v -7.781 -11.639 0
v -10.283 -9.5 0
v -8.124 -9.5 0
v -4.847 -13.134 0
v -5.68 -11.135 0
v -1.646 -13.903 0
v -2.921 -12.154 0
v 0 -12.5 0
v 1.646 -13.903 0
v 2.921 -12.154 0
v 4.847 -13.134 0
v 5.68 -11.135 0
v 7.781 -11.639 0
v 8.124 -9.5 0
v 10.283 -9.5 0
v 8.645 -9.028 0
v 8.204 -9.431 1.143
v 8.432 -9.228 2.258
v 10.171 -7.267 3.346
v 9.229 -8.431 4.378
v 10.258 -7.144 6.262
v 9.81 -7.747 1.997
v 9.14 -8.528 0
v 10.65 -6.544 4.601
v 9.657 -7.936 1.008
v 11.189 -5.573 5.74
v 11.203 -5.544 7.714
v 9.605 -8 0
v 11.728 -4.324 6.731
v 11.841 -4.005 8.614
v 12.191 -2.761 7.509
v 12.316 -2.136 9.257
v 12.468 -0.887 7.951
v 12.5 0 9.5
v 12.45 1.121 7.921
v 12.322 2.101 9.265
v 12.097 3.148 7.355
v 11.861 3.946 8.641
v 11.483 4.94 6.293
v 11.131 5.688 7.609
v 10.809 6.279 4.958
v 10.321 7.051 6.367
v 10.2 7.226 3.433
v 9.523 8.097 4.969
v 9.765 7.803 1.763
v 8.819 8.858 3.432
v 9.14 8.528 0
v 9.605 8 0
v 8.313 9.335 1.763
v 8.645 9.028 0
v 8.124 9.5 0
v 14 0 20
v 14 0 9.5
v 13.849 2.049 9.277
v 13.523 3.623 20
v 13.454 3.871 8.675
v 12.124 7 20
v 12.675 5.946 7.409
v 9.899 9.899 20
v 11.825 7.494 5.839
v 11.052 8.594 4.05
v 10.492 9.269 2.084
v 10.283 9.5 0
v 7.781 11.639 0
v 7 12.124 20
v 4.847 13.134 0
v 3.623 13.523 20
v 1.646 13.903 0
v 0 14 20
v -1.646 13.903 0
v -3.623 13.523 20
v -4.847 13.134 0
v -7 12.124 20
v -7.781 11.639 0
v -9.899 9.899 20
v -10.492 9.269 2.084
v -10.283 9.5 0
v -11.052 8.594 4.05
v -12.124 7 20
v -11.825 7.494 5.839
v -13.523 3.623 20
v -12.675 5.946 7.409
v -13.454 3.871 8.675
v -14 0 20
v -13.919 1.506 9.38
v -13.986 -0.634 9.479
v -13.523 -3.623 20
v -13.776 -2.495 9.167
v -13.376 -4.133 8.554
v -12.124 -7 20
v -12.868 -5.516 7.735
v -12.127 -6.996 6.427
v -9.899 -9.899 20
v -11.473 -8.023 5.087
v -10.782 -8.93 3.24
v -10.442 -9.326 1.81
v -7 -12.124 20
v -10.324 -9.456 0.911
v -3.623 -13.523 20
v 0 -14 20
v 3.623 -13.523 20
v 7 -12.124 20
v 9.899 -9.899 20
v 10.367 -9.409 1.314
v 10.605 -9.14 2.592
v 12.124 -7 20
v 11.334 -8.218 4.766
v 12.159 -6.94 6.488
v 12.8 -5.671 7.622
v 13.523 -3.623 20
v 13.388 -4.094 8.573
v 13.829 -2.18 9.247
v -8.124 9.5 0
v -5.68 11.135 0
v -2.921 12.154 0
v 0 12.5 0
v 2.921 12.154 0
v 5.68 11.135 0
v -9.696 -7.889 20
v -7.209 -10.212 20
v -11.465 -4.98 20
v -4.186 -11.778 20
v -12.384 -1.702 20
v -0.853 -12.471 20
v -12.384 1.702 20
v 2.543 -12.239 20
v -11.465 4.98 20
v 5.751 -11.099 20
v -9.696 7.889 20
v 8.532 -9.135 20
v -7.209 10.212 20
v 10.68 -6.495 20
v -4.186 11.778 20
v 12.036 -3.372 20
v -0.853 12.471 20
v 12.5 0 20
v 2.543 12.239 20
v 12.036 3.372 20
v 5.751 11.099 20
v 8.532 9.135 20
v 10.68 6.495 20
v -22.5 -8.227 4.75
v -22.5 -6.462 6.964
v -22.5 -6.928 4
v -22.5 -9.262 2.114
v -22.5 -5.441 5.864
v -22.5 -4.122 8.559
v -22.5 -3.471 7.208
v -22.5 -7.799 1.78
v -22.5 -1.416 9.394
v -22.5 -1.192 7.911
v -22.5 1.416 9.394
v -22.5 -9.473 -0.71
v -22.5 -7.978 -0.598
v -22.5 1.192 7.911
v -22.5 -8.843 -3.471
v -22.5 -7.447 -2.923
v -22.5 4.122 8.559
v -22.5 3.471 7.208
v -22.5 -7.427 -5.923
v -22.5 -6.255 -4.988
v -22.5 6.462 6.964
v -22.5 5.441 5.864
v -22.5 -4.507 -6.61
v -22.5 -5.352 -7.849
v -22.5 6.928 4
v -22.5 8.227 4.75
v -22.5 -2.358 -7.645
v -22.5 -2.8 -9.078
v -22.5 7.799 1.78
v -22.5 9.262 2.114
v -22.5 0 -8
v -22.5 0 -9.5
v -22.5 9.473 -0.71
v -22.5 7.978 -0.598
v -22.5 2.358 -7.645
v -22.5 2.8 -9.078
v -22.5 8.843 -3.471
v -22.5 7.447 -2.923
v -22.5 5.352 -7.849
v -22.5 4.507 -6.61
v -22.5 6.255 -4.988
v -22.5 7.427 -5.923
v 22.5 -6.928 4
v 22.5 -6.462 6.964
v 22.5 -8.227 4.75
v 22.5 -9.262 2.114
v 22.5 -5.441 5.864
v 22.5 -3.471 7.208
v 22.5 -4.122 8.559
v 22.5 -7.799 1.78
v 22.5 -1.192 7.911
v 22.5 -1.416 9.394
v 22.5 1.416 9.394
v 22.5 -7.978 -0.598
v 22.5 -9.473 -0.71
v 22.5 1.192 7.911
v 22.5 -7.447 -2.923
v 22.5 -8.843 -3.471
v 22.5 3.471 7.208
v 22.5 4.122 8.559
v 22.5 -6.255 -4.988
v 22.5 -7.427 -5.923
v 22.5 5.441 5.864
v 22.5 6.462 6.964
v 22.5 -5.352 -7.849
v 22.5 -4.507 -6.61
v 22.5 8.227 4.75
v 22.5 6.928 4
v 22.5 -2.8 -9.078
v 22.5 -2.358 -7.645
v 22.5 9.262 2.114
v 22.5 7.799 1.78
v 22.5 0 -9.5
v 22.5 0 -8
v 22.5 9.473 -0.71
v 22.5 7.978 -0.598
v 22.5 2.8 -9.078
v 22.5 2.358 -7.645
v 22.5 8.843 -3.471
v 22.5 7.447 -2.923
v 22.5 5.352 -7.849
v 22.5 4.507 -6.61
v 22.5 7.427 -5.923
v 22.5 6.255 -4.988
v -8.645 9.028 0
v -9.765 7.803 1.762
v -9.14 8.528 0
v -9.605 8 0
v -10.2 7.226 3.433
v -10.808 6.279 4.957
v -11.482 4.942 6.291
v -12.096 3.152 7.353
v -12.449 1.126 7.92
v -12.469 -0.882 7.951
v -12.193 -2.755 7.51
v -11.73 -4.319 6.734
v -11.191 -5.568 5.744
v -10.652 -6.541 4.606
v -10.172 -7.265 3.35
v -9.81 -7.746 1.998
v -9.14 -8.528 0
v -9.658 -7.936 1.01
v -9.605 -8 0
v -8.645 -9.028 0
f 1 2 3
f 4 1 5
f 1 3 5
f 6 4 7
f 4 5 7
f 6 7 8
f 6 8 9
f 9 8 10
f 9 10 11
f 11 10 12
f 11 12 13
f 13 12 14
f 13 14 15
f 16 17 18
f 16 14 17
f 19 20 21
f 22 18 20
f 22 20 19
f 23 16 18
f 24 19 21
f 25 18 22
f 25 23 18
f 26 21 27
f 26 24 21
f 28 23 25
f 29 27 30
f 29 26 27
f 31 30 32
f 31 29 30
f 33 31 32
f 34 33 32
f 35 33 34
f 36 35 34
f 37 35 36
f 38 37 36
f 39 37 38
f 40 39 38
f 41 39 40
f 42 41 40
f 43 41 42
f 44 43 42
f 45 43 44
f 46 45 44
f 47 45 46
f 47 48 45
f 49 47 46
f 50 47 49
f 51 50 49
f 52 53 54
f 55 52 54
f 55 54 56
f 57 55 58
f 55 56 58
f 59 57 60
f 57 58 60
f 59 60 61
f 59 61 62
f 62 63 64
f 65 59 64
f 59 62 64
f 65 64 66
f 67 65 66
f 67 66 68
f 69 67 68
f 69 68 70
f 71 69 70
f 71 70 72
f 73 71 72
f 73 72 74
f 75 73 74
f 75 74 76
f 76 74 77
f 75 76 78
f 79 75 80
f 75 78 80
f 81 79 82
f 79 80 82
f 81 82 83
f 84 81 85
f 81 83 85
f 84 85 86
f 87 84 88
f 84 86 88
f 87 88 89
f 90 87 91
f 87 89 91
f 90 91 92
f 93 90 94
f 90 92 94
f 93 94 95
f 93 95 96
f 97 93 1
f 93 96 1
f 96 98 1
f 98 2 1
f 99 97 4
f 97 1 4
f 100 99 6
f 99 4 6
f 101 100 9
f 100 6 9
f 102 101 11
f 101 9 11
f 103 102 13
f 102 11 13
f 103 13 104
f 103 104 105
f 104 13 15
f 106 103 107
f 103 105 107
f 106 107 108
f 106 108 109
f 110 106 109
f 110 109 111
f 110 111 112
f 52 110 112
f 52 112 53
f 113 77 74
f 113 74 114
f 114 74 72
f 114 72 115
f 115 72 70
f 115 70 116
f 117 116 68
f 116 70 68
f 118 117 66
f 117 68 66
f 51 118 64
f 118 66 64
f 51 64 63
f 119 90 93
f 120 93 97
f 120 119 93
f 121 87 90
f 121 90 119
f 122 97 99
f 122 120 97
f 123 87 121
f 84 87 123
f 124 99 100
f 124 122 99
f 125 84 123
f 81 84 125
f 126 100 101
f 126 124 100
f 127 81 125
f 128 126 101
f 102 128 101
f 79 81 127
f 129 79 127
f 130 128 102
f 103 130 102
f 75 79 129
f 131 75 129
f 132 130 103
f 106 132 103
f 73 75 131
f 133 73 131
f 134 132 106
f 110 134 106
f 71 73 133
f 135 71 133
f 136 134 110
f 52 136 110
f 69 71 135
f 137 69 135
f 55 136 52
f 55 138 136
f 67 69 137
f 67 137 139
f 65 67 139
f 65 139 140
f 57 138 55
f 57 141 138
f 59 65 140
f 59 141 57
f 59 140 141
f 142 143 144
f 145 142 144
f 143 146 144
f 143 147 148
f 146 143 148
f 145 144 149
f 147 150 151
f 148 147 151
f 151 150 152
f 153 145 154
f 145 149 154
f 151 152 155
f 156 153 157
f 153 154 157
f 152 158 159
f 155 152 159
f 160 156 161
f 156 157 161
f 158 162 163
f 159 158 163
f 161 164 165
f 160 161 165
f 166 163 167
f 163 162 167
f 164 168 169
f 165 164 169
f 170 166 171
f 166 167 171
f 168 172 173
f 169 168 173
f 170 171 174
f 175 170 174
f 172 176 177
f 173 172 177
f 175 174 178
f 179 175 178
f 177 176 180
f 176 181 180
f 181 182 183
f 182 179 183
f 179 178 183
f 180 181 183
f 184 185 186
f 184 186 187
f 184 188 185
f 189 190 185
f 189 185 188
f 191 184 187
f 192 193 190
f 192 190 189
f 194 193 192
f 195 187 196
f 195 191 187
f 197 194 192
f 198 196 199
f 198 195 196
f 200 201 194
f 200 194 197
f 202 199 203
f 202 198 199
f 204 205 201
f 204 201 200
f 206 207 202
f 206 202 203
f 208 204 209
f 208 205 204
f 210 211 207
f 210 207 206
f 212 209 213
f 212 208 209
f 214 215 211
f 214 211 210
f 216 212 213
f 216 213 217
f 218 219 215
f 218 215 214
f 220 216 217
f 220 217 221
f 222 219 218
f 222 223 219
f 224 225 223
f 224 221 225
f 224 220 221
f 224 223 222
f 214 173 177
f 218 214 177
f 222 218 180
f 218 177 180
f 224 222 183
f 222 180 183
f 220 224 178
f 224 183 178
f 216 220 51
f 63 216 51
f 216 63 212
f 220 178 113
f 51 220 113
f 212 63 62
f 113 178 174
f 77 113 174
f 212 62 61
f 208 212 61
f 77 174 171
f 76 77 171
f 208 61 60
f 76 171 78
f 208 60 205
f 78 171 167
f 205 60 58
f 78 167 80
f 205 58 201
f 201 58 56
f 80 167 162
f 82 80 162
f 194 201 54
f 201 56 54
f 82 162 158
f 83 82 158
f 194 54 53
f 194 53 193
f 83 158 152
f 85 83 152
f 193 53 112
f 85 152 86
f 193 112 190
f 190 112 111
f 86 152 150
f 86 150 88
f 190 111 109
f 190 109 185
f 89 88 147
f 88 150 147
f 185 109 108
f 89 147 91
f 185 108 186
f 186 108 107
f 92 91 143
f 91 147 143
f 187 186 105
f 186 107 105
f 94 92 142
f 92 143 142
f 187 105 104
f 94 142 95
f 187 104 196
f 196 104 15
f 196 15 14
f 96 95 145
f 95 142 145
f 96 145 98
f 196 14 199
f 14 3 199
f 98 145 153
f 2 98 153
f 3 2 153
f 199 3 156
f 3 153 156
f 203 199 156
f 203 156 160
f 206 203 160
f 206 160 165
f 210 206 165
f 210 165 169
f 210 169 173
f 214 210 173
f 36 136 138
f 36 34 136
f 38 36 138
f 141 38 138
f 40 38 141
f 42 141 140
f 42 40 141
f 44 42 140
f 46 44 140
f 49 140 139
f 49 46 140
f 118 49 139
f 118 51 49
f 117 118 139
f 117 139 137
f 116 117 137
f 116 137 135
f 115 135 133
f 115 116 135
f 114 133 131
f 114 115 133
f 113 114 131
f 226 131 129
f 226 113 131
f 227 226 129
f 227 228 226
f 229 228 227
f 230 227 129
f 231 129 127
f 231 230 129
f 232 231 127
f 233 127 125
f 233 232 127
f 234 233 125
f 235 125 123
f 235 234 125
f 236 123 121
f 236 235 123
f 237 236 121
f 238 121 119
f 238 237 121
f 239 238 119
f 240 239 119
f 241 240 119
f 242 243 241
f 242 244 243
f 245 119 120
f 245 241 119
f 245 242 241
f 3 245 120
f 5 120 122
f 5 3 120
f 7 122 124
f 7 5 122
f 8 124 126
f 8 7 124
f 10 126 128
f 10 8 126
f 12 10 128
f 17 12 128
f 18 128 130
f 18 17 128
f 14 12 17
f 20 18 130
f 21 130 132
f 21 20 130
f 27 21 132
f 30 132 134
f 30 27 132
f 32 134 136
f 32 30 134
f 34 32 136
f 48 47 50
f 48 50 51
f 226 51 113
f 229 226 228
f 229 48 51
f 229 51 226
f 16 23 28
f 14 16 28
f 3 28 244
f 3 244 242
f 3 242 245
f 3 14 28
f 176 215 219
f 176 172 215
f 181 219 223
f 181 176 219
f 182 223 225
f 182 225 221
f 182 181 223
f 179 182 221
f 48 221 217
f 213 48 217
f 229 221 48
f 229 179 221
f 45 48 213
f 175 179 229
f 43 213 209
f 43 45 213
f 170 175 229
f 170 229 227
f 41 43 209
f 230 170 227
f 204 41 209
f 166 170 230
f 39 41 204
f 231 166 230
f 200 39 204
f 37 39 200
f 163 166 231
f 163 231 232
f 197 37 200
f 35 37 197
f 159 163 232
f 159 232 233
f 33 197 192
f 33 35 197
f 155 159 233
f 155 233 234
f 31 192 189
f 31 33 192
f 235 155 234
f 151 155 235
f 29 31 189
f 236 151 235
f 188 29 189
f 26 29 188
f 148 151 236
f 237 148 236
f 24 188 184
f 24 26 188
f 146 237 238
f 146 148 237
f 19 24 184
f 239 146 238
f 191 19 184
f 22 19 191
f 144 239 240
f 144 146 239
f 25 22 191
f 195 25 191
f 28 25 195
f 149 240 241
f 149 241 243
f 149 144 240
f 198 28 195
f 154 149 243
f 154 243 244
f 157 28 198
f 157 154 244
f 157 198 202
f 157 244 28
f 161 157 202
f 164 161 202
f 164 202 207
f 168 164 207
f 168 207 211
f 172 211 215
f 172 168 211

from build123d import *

# Parameters (mm, degrees)
SKETCH_1_R               = 14
SKETCH_1_R_2             = 12.5
EXTRUDE_1_DEPTH          = 20
EXTRUDE_2_DEPTH          = 22.5
EXTRUDE_2_DEPTH_BACK     = 22.5
SKETCH_2_R               = 9.5
SKETCH_2_R_2             = 8
CUT_EXTRUDE_1_DEPTH      = 40.654760284
CUT_EXTRUDE_1_DEPTH_BACK = 20
SKETCH_3_R               = 12.5
CUT_EXTRUDE_2_DEPTH      = 52.195703099
CUT_EXTRUDE_2_DEPTH_BACK = 52.195703099
SKETCH_4_R               = 8


with BuildPart() as part:
    # 草图1 → 凸台-拉伸1 (new body)
    with BuildSketch(Plane.XY):
        Circle(SKETCH_1_R)
        Circle(SKETCH_1_R_2, mode=Mode.SUBTRACT)
    extrude(amount=EXTRUDE_1_DEPTH)

    # 草图2 → 凸台-拉伸2 (add, two sides: drawn at the far end of the back side and taken through both)
    with BuildSketch(Plane(origin=(0, 0, 0), x_dir=(0, 0, -1), z_dir=(1, 0, 0)).offset(-EXTRUDE_2_DEPTH_BACK)):
        Circle(SKETCH_2_R)
        Circle(SKETCH_2_R_2, mode=Mode.SUBTRACT)
    extrude(amount=EXTRUDE_2_DEPTH + EXTRUDE_2_DEPTH_BACK)

    # 草图3 → 切除-拉伸1 (cut, two sides: drawn at the far end of the back side and taken through both)
    with BuildSketch(Plane.XY.offset(20).offset(-CUT_EXTRUDE_1_DEPTH_BACK)):
        Circle(SKETCH_3_R)
    extrude(amount=CUT_EXTRUDE_1_DEPTH + CUT_EXTRUDE_1_DEPTH_BACK, mode=Mode.SUBTRACT)

    # 草图4 → 切除-拉伸2 (cut, two sides: drawn at the far end of the back side and taken through both)
    with BuildSketch(Plane(origin=(22.5, 0, 0), x_dir=(0, 0, -1), z_dir=(1, 0, 0)).offset(-CUT_EXTRUDE_2_DEPTH_BACK)):
        Circle(SKETCH_4_R)
    extrude(amount=CUT_EXTRUDE_2_DEPTH + CUT_EXTRUDE_2_DEPTH_BACK, mode=Mode.SUBTRACT)


solid = part.part
